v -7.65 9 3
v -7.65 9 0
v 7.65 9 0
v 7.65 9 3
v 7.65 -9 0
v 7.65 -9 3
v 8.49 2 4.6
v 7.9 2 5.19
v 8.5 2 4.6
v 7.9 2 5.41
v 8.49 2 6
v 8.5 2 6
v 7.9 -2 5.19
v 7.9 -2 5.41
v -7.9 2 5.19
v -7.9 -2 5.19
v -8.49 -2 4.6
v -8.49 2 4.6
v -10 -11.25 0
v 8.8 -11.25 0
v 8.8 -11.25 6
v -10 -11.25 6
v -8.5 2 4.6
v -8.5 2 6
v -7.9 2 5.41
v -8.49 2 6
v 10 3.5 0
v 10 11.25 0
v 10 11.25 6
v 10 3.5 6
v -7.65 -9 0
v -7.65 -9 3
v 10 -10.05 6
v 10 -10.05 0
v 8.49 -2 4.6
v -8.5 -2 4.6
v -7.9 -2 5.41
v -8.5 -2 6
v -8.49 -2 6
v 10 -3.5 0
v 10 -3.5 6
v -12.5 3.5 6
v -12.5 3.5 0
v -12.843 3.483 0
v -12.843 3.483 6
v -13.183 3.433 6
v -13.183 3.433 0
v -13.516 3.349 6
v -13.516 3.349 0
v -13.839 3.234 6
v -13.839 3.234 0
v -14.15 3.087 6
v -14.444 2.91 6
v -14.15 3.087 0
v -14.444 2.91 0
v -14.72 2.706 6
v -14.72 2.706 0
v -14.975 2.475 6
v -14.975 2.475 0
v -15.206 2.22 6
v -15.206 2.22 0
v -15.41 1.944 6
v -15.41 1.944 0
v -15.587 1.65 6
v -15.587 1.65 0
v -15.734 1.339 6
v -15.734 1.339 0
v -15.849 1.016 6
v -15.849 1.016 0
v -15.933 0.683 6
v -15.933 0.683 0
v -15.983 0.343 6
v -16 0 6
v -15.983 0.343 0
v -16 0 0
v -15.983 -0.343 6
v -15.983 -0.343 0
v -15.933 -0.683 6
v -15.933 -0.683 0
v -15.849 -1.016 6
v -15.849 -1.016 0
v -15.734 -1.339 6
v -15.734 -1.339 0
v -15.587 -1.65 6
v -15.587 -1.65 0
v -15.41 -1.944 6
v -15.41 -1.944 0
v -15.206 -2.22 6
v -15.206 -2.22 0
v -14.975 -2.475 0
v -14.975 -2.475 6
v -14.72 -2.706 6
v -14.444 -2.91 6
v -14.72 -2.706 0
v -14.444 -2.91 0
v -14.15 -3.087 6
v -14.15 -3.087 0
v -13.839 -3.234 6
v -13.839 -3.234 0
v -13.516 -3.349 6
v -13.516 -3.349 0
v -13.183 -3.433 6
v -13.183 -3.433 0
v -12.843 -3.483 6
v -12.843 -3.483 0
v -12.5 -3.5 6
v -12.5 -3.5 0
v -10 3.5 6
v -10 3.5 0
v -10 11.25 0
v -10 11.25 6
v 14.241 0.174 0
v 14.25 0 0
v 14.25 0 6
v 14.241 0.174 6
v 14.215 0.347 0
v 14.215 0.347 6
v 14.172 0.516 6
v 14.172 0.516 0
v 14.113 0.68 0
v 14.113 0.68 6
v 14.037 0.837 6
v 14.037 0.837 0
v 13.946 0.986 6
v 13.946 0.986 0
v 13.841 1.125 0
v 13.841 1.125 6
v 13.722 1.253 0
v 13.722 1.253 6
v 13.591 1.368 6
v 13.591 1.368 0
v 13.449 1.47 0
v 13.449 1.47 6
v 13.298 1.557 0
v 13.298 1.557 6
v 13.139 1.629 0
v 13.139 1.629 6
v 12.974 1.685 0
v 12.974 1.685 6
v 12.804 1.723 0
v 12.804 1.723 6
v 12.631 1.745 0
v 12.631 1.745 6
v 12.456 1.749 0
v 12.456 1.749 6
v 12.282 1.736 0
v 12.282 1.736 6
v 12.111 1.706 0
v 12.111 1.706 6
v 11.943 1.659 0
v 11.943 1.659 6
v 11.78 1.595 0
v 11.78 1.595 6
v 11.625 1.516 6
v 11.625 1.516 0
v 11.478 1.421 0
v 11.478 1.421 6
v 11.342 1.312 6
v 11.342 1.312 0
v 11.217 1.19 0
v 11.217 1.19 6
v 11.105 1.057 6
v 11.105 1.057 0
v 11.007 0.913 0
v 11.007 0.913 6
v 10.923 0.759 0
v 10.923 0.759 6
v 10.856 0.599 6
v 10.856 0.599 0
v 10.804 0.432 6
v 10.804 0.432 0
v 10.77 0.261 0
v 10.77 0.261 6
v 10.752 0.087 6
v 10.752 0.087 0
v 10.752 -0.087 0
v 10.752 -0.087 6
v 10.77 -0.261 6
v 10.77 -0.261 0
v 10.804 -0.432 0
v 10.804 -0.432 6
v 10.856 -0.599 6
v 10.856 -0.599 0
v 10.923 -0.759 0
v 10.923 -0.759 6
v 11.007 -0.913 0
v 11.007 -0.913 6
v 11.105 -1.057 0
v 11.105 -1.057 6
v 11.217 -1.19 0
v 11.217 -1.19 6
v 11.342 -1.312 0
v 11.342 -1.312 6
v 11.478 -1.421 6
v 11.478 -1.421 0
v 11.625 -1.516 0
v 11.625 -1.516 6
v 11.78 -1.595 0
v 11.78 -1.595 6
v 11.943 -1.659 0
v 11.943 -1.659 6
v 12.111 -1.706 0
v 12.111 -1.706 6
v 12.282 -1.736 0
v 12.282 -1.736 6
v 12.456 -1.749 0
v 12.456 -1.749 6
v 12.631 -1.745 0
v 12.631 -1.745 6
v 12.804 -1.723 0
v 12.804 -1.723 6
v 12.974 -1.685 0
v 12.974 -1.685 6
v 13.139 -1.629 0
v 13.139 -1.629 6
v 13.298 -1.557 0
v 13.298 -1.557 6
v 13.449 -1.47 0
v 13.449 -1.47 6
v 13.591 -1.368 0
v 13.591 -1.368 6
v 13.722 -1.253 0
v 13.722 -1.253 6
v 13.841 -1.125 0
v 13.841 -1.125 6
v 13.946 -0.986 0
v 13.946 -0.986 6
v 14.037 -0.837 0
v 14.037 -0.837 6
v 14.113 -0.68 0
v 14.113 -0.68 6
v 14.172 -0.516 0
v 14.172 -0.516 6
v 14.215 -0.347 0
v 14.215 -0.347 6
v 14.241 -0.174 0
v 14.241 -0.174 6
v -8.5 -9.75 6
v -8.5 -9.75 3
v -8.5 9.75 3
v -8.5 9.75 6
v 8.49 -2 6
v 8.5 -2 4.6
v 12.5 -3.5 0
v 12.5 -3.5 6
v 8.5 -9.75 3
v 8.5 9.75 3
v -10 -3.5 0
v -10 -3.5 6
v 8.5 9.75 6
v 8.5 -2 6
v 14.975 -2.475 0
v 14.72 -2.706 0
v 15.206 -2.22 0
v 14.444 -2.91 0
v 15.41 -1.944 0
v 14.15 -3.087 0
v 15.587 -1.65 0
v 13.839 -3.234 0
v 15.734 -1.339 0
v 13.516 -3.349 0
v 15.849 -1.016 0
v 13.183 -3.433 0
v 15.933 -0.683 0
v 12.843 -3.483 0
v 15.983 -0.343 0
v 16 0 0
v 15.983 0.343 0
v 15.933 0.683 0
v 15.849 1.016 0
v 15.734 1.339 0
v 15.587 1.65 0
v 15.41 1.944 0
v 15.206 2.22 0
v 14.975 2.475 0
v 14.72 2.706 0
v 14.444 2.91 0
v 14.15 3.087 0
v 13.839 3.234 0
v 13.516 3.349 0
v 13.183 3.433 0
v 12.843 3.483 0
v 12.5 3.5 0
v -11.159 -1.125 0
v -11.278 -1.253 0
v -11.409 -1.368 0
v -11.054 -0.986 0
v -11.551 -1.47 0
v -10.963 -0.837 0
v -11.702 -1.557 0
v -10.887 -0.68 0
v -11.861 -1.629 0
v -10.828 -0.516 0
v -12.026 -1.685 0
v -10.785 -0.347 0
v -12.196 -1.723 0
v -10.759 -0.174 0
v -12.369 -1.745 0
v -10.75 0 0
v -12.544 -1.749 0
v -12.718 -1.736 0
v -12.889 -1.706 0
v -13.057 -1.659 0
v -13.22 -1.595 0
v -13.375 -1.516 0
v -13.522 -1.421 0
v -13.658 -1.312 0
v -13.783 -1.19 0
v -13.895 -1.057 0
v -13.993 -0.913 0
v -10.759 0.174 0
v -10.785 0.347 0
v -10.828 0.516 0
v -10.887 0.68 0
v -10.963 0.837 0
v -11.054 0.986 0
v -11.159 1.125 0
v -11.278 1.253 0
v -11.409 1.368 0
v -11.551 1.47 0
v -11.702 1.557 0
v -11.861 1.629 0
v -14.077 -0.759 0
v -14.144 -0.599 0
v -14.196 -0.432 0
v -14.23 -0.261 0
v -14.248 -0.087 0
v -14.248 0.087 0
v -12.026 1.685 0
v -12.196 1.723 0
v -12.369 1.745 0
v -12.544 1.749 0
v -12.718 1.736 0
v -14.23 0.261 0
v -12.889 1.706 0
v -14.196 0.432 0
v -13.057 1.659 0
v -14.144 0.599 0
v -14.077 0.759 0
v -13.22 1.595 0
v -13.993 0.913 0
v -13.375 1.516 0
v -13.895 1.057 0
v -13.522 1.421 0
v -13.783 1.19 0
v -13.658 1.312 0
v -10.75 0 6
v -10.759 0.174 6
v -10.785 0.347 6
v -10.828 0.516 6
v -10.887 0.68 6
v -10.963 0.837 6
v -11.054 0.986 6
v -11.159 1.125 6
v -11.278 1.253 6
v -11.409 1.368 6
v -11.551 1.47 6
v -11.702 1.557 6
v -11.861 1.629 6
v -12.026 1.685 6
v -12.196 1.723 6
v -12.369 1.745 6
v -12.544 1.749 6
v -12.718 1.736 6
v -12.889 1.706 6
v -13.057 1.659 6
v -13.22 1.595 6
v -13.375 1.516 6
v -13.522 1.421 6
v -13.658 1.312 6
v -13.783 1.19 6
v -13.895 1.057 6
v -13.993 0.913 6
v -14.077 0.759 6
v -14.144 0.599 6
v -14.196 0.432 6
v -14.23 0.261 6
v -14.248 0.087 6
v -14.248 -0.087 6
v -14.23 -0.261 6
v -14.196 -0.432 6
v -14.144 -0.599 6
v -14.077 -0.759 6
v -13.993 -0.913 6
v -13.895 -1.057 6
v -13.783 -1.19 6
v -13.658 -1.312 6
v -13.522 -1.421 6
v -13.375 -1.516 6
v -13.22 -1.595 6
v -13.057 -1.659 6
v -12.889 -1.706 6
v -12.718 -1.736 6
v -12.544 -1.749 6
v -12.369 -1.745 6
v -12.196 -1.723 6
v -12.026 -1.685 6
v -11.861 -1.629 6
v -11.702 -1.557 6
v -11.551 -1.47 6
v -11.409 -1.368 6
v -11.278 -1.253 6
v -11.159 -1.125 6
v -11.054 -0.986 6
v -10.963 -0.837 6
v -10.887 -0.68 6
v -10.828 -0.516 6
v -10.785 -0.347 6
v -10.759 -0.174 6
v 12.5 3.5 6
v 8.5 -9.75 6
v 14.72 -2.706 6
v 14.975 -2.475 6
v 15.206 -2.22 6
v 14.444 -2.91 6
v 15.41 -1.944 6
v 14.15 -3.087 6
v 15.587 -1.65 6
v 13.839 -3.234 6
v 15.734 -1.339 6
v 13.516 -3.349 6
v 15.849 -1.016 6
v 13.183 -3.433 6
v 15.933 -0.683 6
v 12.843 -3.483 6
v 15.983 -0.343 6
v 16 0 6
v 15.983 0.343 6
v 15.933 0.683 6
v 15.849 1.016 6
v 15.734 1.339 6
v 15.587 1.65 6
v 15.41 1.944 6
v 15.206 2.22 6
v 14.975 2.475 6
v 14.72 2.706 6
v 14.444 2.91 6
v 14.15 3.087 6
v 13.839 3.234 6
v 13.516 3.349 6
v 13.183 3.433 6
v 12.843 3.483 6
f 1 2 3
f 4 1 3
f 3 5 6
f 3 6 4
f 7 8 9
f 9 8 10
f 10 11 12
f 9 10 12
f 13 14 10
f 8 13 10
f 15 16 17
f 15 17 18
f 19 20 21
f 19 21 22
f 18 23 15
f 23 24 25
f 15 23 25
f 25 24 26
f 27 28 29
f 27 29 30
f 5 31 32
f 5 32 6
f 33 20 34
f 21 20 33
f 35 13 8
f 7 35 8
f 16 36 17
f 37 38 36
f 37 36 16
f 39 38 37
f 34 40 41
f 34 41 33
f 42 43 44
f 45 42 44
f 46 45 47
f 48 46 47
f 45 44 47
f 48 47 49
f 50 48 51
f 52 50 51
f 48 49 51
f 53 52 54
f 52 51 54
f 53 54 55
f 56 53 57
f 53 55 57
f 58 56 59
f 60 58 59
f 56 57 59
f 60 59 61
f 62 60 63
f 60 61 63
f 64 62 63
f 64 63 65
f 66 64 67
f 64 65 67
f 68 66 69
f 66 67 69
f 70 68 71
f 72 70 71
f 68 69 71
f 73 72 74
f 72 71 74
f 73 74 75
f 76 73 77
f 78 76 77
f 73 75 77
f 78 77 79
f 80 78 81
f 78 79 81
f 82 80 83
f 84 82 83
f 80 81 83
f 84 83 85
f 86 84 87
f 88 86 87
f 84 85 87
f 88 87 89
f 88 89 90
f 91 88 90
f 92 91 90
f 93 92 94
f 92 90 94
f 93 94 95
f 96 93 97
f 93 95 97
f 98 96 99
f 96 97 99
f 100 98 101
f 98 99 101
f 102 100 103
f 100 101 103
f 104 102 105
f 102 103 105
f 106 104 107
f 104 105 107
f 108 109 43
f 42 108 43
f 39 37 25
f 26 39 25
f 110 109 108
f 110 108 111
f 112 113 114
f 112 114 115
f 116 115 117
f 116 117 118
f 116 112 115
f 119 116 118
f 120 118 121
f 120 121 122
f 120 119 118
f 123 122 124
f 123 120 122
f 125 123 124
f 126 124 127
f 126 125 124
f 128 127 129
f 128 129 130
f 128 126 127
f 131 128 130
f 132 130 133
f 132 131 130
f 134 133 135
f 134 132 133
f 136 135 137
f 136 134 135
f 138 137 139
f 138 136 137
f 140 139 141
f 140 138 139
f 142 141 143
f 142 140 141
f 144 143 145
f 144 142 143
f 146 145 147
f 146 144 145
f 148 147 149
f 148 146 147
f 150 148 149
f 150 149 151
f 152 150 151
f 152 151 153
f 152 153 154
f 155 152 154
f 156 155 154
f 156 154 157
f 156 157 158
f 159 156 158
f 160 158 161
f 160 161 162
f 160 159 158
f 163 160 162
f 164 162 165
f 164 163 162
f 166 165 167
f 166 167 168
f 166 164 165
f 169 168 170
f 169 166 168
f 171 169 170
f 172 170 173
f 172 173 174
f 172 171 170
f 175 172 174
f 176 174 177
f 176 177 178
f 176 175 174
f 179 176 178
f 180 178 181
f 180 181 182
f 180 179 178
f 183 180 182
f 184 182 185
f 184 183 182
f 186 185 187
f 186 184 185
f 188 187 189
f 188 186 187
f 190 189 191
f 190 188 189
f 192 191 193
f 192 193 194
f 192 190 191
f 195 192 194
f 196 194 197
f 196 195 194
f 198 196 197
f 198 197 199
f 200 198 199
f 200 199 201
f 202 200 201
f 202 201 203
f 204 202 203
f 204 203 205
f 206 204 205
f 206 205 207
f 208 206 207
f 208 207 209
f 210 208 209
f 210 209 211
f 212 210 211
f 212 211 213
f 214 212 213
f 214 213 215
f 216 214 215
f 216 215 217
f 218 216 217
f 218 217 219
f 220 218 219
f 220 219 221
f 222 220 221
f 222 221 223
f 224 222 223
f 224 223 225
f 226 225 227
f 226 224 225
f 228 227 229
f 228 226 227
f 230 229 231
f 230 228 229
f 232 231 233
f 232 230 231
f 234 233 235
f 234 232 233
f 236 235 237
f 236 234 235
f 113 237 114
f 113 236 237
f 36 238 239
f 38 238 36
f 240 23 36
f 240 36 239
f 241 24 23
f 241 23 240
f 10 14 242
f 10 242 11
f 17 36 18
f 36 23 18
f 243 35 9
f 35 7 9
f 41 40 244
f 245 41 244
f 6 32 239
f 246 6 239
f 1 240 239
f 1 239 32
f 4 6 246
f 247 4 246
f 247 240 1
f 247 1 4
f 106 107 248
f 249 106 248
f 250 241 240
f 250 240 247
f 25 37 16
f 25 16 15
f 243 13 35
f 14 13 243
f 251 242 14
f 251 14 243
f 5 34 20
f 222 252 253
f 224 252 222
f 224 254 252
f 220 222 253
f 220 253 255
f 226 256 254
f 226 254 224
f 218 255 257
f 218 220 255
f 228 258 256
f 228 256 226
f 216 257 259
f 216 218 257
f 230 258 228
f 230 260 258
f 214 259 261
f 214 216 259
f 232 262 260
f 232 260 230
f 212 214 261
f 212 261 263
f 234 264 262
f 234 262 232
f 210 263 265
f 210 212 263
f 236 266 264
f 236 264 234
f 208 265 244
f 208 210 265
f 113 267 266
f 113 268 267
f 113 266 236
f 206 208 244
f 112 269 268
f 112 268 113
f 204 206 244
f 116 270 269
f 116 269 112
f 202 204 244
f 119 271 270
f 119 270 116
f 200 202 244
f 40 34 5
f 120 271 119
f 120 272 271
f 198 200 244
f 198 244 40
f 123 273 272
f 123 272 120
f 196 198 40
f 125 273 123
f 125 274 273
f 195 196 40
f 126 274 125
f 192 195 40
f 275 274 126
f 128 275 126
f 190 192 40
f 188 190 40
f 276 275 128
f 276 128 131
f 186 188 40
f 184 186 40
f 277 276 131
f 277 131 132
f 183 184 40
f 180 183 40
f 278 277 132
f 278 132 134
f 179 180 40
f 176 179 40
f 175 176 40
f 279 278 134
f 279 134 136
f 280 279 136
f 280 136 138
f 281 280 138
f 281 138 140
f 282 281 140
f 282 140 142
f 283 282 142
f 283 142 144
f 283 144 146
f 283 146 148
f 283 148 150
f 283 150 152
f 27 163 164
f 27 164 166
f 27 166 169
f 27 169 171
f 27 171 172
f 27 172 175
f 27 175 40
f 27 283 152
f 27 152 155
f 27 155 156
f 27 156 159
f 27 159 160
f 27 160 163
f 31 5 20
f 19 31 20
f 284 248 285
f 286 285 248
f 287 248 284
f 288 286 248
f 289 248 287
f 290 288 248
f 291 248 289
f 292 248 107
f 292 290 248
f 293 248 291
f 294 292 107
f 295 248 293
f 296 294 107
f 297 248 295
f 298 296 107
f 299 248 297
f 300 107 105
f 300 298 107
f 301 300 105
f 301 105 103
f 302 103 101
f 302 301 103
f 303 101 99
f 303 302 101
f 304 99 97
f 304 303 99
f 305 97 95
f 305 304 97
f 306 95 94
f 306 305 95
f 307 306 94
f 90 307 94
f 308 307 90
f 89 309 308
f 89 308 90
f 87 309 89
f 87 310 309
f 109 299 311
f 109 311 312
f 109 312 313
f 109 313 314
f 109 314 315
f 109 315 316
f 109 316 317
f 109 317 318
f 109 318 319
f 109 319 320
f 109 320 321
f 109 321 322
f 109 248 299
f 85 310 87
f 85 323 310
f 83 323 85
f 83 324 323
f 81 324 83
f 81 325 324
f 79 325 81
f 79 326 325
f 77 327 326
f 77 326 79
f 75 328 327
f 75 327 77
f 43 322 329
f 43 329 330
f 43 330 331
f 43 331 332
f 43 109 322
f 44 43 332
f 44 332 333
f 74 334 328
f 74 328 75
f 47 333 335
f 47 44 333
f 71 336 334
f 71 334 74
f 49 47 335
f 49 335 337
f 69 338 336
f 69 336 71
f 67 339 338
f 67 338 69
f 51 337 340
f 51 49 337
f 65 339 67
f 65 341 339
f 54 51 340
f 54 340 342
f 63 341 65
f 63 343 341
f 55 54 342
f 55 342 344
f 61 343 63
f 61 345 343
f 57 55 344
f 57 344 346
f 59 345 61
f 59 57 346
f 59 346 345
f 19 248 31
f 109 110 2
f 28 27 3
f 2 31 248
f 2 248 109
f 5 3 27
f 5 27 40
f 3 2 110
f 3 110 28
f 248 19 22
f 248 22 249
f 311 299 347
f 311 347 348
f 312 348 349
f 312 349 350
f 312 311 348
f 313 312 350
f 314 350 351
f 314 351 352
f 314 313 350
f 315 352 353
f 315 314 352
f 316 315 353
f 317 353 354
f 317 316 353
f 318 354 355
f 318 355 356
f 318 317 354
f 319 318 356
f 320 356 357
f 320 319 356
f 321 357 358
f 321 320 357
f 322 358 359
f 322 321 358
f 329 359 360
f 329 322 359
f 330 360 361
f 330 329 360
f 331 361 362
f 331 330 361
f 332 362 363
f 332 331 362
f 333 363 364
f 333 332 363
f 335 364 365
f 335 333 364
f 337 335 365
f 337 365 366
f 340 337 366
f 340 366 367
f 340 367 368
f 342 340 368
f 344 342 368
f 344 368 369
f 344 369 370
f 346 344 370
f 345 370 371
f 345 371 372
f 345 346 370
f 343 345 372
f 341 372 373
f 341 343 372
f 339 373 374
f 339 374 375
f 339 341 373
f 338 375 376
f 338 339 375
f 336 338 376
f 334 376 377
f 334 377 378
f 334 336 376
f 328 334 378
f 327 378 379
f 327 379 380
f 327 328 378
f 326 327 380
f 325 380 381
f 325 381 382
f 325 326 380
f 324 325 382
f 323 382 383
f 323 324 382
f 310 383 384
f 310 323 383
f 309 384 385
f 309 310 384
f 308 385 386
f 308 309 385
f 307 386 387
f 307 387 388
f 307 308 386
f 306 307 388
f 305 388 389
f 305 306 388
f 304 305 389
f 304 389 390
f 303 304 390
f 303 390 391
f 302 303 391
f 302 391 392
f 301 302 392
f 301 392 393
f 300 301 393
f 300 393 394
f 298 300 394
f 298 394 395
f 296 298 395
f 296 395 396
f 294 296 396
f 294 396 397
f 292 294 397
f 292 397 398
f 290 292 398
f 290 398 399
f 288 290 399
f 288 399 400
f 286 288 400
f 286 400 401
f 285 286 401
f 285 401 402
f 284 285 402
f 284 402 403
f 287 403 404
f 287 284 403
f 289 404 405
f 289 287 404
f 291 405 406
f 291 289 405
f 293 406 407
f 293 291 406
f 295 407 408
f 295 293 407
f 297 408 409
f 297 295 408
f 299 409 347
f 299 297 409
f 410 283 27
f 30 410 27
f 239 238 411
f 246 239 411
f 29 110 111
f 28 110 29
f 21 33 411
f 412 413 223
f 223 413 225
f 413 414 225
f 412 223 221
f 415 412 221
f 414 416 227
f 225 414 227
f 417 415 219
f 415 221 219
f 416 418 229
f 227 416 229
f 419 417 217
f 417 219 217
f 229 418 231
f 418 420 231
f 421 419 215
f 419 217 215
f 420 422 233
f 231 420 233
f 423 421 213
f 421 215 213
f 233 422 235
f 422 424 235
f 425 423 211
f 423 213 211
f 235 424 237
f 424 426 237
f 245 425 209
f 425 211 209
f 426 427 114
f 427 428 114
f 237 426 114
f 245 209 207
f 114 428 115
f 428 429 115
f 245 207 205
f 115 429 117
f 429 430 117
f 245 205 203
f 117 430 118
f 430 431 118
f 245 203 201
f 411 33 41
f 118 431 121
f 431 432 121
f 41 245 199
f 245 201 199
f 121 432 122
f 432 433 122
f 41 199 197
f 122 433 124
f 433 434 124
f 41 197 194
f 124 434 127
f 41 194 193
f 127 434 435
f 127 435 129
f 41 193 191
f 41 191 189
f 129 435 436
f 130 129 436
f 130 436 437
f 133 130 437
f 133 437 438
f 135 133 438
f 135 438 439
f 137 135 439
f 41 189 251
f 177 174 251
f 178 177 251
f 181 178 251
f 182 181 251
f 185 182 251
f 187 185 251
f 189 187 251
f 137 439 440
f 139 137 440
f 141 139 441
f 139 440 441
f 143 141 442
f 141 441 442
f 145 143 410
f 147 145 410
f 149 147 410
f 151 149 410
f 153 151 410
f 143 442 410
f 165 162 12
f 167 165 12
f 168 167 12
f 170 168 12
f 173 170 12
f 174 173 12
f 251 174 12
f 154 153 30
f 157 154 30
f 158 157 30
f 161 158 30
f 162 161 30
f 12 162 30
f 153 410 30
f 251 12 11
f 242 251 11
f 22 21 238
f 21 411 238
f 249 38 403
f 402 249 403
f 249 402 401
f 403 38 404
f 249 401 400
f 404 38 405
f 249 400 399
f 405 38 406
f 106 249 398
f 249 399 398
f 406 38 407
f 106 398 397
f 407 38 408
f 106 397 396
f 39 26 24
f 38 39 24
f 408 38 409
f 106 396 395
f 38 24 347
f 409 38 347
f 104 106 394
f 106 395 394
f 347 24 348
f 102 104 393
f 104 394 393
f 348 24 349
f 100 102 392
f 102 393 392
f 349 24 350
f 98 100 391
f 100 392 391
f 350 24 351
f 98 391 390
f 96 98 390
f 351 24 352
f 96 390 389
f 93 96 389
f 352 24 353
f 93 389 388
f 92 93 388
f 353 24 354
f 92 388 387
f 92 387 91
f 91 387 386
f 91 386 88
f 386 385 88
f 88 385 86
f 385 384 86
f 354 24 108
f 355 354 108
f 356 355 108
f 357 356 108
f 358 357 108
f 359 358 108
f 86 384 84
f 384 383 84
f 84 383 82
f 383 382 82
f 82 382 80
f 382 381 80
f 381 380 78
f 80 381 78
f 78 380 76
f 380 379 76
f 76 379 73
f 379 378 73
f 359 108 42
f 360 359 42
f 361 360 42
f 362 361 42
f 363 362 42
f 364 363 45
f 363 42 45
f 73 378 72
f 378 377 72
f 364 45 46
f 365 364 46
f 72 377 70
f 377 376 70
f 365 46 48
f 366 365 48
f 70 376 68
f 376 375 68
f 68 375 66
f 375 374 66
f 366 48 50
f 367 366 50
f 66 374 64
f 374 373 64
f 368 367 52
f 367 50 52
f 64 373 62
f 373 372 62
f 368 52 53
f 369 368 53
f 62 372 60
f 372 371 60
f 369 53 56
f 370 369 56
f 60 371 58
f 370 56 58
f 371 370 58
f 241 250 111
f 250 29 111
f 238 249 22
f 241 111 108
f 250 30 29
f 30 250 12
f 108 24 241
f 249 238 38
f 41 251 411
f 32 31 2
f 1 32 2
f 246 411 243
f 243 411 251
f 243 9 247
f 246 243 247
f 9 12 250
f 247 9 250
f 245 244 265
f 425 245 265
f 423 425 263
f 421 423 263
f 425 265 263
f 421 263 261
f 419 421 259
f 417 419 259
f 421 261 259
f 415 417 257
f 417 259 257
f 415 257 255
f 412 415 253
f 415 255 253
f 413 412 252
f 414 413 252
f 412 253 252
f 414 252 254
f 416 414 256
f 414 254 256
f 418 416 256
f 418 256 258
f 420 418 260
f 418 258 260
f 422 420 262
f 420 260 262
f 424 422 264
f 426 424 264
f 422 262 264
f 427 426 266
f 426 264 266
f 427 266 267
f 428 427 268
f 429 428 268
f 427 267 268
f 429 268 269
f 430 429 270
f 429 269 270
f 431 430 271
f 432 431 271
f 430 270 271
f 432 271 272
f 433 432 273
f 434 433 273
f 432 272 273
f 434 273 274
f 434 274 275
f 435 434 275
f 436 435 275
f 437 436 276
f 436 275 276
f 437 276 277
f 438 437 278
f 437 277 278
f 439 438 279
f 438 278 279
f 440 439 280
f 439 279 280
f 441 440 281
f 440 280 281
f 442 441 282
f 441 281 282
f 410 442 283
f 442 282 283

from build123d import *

# Parameters (mm, degrees)
SKETCH_R        = 1.75
SKETCH_W        = 15.3
SKETCH_H        = 18
PAD_DEPTH       = 6
SKETCH001_W     = 17
SKETCH001_H     = 19.5
POCKET_DEPTH    = 3
SKETCH002_W     = 0.6
SKETCH002_H     = 4
PAD001_DEPTH    = 1.4
CHAMFER_SIZE    = 0.59
CHAMFER001_SIZE = 1.2


with BuildPart() as part:
    # Sketch → Pad (new body)
    with BuildSketch(Plane.XY):
        with BuildLine():
            Line((-10, 11.25), (10, 11.25))
            Line((10, 11.25), (10, 3.5))
            Line((12.5, 3.5), (10, 3.5))
            ThreePointArc((12.5, -3.5), (16, 0), (12.5, 3.5))
            Line((10, -3.5), (12.5, -3.5))
            Line((10, -3.5), (10, -11.25))
            Line((10, -11.25), (-10, -11.25))
            Line((-10, -11.25), (-10, -3.5))
            Line((-12.5, -3.5), (-10, -3.5))
            ThreePointArc((-12.5, 3.5), (-16, 0), (-12.5, -3.5))
            Line((-10, 3.5), (-12.5, 3.5))
            Line((-10, 3.5), (-10, 11.25))
        make_face()
        with Locations((-12.5, 0)):
            Circle(SKETCH_R, mode=Mode.SUBTRACT)
        with Locations((12.5, 0)):
            Circle(SKETCH_R, mode=Mode.SUBTRACT)
        Rectangle(SKETCH_W, SKETCH_H, mode=Mode.SUBTRACT)
    extrude(amount=PAD_DEPTH)

    # Sketch001 (on Face20 of Pad) → Pocket (cut)
    with BuildSketch(Plane.XY.offset(6)):
        Rectangle(SKETCH001_W, SKETCH001_H)
    extrude(amount=-POCKET_DEPTH, mode=Mode.SUBTRACT)

    # Sketch002 (on Face5 of Pocket) → Pad001 (join)
    with BuildSketch(Plane.XY.offset(6)):
        with Locations((-8.2, 0)):
            Rectangle(SKETCH002_W, SKETCH002_H)
        with Locations((8.2, 0)):
            Rectangle(SKETCH002_W, SKETCH002_H)
    extrude(amount=-PAD001_DEPTH)

    # Chamfer
    chamfer_edges = [part.edges().sort_by_distance(p)[0] for p in [
        (7.9, 0, 6),
        (7.9, 0, 4.6),
        (-7.9, 0, 6),
        (-7.9, 0, 4.6),
    ]]
    chamfer(chamfer_edges, length=CHAMFER_SIZE)

    # Chamfer001
    chamfer001_edges = [part.edges().sort_by_distance(p)[0] for p in [
        (10, -11.25, 3),
    ]]
    chamfer(chamfer001_edges, length=CHAMFER001_SIZE)


solid = part.part
